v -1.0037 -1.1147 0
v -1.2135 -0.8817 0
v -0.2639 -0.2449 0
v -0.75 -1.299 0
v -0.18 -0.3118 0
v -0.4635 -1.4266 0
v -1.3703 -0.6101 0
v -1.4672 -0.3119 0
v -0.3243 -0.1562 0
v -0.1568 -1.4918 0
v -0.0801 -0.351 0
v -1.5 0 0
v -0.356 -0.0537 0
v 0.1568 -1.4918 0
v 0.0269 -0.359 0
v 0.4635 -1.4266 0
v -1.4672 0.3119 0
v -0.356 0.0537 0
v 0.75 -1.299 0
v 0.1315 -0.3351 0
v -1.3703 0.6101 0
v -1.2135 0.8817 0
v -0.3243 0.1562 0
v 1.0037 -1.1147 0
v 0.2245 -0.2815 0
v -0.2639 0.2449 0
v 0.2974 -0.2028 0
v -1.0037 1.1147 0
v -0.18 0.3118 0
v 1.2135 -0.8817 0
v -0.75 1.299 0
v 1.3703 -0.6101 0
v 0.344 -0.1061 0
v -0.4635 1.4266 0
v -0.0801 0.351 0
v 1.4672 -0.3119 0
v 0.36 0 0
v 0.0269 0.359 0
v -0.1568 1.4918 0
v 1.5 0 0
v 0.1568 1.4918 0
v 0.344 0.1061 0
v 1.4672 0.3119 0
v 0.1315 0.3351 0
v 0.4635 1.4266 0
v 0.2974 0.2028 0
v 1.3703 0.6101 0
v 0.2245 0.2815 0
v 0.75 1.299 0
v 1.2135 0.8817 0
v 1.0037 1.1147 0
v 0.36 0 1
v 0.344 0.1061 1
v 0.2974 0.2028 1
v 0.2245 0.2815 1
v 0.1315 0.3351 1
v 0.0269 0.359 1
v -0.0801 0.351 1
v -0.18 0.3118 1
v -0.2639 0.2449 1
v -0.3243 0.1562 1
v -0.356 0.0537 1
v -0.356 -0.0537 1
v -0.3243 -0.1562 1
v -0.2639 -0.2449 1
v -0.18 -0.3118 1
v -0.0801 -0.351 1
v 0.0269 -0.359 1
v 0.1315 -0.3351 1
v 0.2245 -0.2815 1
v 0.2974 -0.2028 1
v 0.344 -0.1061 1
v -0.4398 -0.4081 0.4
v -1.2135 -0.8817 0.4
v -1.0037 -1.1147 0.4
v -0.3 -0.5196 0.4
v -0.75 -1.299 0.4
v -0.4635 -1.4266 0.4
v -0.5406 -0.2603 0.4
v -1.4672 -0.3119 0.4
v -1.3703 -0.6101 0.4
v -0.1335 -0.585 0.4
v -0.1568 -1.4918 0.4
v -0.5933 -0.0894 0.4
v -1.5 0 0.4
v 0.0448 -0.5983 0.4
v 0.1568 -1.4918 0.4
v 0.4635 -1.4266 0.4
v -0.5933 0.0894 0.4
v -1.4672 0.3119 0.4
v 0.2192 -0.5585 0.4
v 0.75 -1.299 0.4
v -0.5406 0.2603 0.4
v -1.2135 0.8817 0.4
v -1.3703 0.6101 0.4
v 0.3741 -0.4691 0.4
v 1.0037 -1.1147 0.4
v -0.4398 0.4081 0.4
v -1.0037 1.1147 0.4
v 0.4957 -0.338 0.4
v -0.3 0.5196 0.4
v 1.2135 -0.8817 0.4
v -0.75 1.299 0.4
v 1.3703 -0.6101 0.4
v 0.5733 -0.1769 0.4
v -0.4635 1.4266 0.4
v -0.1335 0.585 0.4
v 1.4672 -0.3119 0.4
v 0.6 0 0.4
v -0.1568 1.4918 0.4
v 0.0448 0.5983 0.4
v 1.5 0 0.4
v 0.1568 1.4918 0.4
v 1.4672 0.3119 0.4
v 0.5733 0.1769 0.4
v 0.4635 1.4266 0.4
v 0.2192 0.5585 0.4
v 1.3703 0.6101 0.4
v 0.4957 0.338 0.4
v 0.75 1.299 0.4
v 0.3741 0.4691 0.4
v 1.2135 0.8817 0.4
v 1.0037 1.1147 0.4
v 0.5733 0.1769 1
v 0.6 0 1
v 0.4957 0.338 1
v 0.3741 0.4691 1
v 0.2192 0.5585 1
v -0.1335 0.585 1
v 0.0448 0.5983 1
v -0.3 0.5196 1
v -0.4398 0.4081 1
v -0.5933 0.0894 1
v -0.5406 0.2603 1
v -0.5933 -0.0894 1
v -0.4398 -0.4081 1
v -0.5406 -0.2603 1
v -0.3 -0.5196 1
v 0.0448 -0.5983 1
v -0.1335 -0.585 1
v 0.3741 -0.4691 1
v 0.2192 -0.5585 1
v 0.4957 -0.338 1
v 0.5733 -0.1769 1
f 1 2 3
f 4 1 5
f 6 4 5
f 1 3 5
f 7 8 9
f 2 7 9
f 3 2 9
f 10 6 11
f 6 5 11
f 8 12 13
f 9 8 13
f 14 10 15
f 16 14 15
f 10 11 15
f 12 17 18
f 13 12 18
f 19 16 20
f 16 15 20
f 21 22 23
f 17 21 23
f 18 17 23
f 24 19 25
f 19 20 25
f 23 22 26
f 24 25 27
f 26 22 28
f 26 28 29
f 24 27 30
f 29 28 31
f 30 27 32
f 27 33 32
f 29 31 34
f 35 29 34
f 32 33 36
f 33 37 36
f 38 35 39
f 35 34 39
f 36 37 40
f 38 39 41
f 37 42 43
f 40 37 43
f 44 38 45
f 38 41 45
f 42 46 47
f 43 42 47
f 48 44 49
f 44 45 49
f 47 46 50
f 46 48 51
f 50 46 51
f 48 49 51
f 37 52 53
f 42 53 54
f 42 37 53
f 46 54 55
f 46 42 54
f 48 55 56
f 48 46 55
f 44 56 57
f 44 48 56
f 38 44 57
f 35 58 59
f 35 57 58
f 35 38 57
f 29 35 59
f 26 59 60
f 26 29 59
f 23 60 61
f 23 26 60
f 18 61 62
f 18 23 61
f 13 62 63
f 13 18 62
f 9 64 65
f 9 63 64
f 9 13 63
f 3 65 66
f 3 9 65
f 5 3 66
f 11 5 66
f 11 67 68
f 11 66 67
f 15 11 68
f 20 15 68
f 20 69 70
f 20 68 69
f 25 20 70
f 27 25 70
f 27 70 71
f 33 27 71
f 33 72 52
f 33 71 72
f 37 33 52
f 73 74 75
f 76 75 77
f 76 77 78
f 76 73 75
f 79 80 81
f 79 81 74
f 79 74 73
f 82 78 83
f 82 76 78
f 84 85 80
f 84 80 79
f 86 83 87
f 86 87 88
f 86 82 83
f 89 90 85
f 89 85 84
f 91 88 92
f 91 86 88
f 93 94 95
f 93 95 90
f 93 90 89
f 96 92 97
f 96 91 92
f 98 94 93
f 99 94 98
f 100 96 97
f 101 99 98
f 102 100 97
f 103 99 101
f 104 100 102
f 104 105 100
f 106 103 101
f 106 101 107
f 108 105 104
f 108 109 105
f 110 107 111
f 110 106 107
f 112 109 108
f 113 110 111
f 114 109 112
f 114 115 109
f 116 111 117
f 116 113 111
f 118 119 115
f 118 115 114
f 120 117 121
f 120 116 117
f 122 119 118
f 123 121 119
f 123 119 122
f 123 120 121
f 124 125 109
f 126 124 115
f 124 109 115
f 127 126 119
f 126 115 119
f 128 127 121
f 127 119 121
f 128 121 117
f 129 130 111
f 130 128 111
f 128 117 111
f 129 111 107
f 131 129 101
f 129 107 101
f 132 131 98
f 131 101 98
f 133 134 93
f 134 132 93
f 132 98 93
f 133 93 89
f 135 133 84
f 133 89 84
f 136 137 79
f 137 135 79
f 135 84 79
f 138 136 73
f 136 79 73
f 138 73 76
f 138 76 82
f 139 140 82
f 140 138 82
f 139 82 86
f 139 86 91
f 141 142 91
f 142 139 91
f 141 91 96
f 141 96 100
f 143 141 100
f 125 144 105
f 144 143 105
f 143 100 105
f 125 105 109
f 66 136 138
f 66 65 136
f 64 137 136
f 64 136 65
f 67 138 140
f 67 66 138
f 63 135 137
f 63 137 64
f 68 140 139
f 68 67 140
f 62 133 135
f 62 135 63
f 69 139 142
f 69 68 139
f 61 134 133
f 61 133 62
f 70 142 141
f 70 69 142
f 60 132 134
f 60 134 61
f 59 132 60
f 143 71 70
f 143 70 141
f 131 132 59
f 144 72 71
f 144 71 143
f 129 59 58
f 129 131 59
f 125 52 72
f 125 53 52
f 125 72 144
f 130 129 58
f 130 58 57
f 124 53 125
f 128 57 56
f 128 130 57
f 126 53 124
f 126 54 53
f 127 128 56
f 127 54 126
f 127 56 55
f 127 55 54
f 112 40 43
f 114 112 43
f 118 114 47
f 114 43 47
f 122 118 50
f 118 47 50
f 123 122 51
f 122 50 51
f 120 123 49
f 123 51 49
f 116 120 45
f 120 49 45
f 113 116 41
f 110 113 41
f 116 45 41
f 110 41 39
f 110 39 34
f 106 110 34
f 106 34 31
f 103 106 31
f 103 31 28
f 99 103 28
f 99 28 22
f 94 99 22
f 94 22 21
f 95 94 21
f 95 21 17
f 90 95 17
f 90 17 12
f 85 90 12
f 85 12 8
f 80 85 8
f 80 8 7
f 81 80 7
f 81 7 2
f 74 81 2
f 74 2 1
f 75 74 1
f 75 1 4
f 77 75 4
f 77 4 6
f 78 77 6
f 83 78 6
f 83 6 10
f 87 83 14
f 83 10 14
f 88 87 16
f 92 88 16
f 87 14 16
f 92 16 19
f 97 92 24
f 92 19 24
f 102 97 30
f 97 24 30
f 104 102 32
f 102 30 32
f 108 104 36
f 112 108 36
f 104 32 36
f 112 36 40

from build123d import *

# Parameters (mm, degrees)
TUBE_R            = 1.5
TUBE_R_2          = 0.6
TUBE_DEPTH        = 2
CYLINDER_R        = 0.36
CYLINDER_DEPTH    = 10
CYLINDER001_R     = 1.5
CYLINDER001_DEPTH = 1


with BuildPart() as tube:
    # Tube → Tube (new body)
    with BuildSketch(Plane.XY.offset(0.4)):
        Circle(TUBE_R)
        Circle(TUBE_R_2, mode=Mode.SUBTRACT)
    extrude(amount=TUBE_DEPTH)


with BuildPart() as cylinder:
    # Cylinder → Cylinder (new body)
    with BuildSketch(Plane.XY):
        Circle(CYLINDER_R)
    extrude(amount=CYLINDER_DEPTH)


with BuildPart() as bushingfront:
    # Cylinder001 → Cylinder001 (new body)
    with BuildSketch(Plane.XY):
        Circle(CYLINDER001_R)
    extrude(amount=CYLINDER001_DEPTH)

    # Cut: cut Cylinder
    add(cylinder.part, mode=Mode.SUBTRACT)

    # Cut001: cut Tube
    add(tube.part, mode=Mode.SUBTRACT)


solid = bushingfront.part
